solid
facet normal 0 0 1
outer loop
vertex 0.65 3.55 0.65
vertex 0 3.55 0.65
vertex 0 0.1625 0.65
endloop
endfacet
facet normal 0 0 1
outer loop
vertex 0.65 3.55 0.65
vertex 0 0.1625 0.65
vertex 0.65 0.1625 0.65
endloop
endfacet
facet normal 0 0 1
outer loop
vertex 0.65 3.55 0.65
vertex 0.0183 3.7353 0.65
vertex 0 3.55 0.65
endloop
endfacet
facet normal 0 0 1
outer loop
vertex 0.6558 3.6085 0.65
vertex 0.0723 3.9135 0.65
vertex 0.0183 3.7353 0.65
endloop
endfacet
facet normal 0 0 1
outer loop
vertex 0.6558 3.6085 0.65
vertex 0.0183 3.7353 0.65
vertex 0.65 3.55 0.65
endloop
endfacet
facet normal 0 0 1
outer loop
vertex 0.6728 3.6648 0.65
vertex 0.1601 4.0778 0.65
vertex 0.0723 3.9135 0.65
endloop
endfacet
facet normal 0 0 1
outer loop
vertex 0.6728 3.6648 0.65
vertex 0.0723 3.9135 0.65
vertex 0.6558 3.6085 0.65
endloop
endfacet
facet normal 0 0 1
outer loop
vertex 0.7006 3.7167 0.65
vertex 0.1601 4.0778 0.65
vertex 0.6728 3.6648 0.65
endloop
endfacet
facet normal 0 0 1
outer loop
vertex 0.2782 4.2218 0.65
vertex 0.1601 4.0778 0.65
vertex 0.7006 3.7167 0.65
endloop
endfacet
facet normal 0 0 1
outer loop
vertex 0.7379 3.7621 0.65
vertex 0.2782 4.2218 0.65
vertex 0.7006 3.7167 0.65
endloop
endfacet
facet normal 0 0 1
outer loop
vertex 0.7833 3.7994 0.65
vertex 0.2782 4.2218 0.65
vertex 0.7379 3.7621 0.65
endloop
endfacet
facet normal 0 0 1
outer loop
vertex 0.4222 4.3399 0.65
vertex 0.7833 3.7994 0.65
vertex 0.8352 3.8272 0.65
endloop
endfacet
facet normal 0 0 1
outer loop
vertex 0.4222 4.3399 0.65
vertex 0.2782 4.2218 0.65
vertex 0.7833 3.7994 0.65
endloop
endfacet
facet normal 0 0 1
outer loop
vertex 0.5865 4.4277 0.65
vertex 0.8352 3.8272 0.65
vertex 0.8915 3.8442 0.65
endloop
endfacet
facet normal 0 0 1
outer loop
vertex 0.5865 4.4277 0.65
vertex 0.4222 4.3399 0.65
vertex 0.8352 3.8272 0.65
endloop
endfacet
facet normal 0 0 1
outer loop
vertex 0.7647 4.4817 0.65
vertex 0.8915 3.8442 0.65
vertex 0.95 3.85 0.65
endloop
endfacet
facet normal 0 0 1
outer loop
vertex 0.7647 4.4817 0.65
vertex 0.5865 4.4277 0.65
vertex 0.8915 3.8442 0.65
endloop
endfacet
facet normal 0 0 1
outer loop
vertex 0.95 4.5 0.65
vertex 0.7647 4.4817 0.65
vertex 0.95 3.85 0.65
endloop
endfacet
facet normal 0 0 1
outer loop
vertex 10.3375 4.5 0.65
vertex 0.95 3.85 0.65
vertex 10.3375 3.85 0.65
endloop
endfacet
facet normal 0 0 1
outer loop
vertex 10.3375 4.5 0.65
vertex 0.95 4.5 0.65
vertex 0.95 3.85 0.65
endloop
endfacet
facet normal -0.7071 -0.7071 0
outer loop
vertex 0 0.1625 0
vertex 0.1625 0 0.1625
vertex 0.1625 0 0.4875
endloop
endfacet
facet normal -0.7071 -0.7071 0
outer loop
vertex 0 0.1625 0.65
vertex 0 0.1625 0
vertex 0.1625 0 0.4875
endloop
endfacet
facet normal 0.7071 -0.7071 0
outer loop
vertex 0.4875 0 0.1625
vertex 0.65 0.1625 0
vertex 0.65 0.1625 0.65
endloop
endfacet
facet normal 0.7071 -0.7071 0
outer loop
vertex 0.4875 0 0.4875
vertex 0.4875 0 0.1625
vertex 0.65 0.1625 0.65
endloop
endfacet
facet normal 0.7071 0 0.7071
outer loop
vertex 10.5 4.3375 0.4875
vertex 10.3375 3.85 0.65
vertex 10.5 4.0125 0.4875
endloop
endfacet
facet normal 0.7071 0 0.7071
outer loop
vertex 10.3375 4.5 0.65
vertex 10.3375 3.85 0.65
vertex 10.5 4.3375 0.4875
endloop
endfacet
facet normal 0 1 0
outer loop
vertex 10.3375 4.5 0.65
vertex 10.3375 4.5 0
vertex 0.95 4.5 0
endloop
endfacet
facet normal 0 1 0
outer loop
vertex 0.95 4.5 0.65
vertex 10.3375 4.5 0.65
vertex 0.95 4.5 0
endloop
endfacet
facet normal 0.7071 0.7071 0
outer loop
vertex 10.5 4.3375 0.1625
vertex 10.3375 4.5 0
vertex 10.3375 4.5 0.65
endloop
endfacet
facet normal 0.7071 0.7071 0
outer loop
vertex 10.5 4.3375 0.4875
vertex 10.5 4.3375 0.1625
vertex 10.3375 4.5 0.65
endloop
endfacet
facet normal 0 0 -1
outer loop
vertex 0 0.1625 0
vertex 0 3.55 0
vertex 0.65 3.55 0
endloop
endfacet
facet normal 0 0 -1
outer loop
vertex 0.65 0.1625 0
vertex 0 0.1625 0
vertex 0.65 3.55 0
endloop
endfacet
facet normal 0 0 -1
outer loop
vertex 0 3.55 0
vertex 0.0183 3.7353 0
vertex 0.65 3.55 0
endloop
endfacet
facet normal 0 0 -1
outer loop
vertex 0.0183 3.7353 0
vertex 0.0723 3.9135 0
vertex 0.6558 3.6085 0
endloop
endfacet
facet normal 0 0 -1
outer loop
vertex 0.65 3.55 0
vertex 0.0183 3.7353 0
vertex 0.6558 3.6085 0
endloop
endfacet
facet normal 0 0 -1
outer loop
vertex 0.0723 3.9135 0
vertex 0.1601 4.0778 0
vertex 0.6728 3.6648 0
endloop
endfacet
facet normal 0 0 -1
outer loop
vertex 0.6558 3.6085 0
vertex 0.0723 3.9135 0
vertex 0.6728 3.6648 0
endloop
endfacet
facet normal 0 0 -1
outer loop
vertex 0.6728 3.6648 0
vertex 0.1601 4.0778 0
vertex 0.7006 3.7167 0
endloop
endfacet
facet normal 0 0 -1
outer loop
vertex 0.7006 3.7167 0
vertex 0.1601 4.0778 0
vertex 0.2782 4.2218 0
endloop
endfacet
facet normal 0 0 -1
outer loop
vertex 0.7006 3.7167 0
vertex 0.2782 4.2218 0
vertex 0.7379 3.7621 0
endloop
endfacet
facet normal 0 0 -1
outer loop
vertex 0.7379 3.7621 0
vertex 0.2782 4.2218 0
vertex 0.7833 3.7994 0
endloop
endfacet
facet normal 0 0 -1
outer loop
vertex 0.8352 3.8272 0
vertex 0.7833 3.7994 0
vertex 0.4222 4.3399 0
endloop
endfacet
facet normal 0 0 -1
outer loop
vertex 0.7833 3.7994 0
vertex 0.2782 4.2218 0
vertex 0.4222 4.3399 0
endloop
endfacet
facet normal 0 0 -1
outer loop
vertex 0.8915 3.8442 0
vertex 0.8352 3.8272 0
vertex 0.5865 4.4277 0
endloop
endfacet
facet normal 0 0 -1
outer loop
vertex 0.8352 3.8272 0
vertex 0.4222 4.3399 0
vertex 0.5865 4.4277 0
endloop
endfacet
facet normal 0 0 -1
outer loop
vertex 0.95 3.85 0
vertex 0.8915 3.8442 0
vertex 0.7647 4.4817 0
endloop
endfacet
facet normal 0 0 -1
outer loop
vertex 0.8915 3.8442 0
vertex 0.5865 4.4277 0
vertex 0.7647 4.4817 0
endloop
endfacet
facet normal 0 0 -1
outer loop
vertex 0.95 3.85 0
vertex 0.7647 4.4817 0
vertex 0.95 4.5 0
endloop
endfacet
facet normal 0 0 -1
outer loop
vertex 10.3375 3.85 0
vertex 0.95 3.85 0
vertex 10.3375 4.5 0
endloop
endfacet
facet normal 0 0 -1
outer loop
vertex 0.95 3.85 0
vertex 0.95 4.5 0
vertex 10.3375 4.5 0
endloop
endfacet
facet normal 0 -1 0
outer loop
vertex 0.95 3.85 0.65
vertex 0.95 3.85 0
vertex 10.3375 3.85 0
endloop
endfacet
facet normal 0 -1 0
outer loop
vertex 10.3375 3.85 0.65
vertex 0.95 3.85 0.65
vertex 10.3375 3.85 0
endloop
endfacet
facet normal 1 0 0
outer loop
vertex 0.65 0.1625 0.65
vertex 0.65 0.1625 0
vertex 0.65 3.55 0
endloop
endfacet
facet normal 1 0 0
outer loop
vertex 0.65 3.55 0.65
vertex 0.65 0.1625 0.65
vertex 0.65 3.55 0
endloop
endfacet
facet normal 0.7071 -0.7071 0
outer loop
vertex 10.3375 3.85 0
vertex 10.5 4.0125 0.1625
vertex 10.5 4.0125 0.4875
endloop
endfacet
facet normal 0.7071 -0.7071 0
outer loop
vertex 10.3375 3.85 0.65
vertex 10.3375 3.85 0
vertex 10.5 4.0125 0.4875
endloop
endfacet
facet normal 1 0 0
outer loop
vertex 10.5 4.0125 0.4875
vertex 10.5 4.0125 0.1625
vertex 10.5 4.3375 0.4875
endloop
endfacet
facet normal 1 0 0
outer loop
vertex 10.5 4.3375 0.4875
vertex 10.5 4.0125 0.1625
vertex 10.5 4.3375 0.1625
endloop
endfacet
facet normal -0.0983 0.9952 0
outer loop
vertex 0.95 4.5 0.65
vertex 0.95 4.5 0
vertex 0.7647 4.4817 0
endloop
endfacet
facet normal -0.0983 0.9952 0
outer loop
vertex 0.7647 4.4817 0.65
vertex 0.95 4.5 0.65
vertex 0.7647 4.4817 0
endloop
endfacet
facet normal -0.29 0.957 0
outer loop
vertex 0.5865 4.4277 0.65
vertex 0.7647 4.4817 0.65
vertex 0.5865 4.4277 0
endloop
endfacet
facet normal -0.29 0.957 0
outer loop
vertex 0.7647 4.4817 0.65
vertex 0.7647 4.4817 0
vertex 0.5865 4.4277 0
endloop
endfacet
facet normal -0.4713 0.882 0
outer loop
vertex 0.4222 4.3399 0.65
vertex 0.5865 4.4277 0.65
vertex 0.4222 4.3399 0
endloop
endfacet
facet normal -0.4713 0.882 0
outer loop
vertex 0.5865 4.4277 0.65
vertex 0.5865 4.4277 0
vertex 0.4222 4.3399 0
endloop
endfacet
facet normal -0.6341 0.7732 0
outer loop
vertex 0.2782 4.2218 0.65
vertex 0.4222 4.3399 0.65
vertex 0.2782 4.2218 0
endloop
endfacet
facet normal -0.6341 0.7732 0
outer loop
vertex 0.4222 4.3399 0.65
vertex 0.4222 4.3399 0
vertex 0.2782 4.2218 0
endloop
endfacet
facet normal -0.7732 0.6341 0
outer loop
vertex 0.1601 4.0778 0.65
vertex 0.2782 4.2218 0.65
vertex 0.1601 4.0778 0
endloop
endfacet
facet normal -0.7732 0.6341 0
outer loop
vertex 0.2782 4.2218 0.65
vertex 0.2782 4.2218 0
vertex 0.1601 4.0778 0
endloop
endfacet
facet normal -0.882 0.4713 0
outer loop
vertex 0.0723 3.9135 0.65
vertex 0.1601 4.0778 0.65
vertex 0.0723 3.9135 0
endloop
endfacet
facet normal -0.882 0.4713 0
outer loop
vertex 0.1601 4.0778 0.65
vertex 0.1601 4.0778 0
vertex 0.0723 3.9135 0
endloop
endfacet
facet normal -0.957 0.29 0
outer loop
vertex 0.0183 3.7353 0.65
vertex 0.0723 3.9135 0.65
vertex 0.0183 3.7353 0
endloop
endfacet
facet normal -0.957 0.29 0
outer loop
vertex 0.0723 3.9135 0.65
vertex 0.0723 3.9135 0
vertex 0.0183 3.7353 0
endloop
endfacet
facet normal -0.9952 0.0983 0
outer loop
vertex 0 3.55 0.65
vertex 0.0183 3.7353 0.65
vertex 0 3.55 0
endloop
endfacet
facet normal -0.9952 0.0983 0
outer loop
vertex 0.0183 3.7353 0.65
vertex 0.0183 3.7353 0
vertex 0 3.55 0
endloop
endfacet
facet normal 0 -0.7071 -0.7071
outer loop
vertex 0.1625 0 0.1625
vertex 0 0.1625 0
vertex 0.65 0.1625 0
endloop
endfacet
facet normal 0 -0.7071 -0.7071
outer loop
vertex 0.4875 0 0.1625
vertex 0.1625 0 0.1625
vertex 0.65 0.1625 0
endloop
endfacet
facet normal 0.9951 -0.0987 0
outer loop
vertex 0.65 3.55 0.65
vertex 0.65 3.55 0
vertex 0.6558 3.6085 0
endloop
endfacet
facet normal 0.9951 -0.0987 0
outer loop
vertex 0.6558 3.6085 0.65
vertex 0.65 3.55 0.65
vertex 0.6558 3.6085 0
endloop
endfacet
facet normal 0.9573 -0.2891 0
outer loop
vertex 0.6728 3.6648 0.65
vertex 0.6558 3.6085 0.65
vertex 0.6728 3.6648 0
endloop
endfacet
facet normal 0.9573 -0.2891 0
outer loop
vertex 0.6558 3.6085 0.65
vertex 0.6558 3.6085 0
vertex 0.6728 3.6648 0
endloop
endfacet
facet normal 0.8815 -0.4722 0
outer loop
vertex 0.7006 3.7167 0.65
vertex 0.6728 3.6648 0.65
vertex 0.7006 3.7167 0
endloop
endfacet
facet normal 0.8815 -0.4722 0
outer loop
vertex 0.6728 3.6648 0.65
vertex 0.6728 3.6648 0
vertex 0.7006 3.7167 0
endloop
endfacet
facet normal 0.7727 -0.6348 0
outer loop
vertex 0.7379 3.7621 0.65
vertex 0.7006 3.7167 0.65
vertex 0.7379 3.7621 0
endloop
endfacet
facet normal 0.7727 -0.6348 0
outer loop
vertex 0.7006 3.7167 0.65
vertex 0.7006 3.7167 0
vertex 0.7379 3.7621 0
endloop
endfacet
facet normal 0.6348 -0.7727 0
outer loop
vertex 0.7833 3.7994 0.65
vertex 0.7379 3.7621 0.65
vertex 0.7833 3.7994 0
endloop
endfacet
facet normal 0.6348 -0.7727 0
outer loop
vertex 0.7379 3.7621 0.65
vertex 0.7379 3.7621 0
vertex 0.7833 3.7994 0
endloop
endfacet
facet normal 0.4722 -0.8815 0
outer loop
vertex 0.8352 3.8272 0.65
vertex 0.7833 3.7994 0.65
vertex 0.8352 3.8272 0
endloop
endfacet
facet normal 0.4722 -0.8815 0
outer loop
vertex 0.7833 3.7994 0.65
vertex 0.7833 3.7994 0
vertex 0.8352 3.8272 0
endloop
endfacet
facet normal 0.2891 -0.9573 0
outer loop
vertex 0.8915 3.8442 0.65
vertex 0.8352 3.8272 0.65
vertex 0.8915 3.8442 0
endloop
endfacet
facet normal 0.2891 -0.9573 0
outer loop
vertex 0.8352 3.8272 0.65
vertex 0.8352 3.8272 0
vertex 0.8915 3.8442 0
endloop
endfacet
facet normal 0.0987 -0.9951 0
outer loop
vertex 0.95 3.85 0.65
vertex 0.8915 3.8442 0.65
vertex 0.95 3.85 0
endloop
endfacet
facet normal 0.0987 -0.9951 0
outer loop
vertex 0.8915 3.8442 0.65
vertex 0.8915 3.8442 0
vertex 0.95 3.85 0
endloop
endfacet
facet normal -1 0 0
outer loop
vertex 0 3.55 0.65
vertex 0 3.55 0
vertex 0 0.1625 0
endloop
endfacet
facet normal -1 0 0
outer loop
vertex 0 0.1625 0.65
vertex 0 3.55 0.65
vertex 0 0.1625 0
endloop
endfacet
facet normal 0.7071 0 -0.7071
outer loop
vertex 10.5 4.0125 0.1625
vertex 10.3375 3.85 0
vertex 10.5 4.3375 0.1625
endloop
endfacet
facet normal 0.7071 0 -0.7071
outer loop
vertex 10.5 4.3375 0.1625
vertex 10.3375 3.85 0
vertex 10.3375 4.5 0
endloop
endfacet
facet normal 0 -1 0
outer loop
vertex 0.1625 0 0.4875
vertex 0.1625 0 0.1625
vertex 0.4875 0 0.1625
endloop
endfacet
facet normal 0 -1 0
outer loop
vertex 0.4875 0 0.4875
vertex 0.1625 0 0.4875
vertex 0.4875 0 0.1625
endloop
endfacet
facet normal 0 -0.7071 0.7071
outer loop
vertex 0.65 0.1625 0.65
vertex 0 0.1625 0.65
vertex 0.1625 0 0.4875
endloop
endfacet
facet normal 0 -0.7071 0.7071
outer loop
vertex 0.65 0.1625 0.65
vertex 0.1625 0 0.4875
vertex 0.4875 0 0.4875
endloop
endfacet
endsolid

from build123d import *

# Parameters (mm, degrees)
BODY_DEPTH     = 0.65
CHAMFER_2_SIZE = 0.1625


with BuildPart() as part:
    # Sketch1 → Body (new body)
    with BuildSketch(Plane.XY):
        with BuildLine():
            Line((0, 3.55), (0, 0))
            Line((0, 0), (0.65, 0))
            Line((0.65, 0), (0.65, 3.55))
            ThreePointArc((0.65, 3.55), (0.737867966, 3.762132034), (0.95, 3.85))
            Line((0.95, 3.85), (10.5, 3.85))
            Line((10.5, 3.85), (10.5, 4.5))
            Line((10.5, 4.5), (0.95, 4.5))
            ThreePointArc((0.95, 4.5), (0.278248558, 4.221751442), (0, 3.55))
        make_face()
    extrude(amount=BODY_DEPTH)

    # Chamfer 2
    chamfer_2_edges = [part.edges().sort_by_distance(p)[0] for p in [
        (0, 0, 0.325),
        (0.65, 0, 0.325),
        (0.325, 0, 0),
        (0.325, 0, 0.65),
        (10.5, 3.85, 0.325),
        (10.5, 4.5, 0.325),
        (10.5, 4.175, 0),
        (10.5, 4.175, 0.65),
    ]]
    chamfer(chamfer_2_edges, length=CHAMFER_2_SIZE)


solid = part.part
